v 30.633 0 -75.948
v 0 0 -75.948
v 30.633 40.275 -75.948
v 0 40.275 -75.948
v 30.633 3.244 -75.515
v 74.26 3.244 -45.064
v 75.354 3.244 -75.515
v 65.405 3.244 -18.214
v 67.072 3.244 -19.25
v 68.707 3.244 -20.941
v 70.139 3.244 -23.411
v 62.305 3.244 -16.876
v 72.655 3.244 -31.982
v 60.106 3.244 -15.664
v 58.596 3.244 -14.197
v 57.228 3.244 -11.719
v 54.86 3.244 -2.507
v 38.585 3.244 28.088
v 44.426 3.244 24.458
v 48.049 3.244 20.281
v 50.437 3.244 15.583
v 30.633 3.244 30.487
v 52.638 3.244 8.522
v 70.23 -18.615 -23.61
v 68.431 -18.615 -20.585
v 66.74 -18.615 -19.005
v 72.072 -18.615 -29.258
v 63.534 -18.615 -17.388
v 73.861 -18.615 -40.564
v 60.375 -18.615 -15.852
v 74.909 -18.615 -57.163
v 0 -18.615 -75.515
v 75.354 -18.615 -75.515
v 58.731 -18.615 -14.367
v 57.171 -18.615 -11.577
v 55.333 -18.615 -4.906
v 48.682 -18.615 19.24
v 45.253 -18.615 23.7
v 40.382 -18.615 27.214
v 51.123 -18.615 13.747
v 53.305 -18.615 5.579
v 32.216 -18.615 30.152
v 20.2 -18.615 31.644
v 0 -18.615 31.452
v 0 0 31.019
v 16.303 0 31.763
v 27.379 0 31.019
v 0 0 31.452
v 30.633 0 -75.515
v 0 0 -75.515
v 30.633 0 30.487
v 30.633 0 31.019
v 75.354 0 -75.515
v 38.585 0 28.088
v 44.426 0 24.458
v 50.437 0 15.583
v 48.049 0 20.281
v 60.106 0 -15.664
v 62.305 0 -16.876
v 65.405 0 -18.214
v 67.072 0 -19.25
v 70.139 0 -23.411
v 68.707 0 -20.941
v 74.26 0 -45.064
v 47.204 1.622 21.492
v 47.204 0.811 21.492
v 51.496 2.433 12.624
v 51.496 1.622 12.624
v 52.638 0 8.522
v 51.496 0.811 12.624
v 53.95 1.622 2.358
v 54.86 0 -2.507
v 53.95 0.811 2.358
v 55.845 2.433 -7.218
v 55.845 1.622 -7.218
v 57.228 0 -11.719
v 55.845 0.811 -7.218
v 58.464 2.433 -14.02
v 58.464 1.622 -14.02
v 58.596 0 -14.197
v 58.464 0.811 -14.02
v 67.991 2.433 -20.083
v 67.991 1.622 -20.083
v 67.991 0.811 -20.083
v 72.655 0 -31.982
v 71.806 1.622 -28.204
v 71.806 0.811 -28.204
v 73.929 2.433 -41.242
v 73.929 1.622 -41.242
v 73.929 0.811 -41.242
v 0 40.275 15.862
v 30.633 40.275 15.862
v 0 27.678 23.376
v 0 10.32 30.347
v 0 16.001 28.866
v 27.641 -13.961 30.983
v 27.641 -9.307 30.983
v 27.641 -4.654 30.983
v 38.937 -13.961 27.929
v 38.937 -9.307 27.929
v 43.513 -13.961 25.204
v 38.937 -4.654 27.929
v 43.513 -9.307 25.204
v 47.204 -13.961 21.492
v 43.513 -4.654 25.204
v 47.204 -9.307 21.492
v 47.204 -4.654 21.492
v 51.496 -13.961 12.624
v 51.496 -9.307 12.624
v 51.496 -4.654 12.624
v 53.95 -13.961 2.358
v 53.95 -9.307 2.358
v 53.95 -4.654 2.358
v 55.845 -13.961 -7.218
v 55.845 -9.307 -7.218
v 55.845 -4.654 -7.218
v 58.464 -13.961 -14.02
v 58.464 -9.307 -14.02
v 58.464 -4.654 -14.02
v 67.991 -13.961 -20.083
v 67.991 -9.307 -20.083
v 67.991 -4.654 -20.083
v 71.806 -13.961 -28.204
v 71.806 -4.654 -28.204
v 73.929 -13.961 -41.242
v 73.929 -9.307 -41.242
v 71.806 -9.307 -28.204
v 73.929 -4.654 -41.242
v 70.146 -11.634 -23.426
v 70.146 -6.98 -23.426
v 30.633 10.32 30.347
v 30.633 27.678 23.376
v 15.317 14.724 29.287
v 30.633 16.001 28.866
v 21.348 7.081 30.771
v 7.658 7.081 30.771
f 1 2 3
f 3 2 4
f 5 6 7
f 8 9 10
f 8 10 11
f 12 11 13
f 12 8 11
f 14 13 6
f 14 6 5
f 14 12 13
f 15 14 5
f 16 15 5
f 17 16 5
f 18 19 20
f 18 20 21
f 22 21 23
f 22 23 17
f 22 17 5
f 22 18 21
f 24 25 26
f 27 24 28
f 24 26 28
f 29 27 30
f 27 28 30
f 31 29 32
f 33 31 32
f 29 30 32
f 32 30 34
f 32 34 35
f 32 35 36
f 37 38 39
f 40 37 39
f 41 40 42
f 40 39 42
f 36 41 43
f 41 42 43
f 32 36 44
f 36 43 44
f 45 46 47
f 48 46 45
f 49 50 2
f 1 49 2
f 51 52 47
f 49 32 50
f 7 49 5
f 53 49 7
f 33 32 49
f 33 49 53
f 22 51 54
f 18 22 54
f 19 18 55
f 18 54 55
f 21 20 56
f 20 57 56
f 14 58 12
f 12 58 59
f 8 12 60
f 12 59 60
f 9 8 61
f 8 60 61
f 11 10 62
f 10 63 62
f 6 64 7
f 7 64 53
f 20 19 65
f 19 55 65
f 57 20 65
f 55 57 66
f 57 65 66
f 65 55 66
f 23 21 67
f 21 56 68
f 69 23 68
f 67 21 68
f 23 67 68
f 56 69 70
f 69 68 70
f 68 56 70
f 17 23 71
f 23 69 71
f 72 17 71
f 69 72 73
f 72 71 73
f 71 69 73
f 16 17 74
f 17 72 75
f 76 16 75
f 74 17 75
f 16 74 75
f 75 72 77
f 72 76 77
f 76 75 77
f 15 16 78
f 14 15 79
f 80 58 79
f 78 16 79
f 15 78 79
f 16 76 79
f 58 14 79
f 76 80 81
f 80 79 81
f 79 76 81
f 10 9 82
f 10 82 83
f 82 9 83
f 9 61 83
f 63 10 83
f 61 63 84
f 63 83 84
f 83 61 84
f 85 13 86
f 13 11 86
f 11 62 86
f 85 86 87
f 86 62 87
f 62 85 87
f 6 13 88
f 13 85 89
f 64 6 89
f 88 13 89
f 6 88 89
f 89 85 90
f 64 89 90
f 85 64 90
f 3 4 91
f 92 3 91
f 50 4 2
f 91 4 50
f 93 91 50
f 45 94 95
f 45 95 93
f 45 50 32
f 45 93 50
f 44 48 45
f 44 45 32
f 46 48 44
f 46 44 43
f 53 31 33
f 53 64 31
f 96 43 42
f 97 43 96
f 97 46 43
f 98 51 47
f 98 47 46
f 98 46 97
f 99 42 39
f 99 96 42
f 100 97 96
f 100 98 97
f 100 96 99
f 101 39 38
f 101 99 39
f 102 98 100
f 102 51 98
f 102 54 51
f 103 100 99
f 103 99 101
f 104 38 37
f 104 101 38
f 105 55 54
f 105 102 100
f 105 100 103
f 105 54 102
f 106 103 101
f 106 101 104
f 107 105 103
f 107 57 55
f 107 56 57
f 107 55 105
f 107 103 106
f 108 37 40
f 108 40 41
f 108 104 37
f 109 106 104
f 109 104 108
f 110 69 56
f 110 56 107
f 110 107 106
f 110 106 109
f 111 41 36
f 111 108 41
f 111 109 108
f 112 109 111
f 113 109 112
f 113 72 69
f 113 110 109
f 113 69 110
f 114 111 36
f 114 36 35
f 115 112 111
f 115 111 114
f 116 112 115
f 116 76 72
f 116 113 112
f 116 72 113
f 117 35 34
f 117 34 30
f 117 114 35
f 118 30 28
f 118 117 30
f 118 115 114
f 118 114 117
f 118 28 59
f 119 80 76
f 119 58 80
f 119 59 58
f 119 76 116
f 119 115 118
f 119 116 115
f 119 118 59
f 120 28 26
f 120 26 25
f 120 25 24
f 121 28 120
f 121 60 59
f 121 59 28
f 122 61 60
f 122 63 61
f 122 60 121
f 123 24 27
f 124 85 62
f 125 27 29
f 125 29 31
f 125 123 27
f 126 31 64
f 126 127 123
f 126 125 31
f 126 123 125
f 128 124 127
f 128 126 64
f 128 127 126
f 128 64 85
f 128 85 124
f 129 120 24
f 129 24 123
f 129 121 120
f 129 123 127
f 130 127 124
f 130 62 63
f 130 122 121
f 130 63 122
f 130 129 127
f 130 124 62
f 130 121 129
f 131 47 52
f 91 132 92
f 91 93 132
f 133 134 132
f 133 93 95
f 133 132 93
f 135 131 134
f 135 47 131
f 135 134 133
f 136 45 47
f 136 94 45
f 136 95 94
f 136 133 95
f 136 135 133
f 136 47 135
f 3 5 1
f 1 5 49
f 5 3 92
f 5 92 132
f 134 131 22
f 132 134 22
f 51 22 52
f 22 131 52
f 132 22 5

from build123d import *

# Parameters (mm, degrees)
F1_DEPTH = 18.6145622283
F3_DEPTH = 30.6332651526
F4_DEPTH = 3.2437127084


with BuildPart() as f1:
    # F0 (on Front) → F1 (new body)
    with BuildSketch(Plane.XZ):
        with BuildLine():
            add(Edge.make_bspline(
                [(0, 31.4521491528), (19.3250022149, 32.1420349874), (55.63183594, 33.4381572148), (53.4807526814, -18.3300440163), (74.2555818679, -15.9806421094), (74.9053246961, -51.2094172374), (75.3536224365, -75.5153298378)],
                knots=[0, 0, 0, 0, 0.2907666026, 0.5462774898, 0.6869562964, 1, 1, 1, 1], degree=3))
            Line((0, 31.4521491528), (0, -75.5153298378))
            Line((0, -75.5153298378), (75.3536224365, -75.5153298378))
        make_face()
    extrude(amount=F1_DEPTH)

    # F2 (on Right) → F3 (join)
    with BuildSketch(Plane.YZ):
        with BuildLine():
            add(Edge.make_bspline(
                [(0, 31.0191214085), (4.6584274068, 30.9906545137), (15.8166830326, 30.9224686442), (31.2721852153, 21.4055246166), (40.2752161026, 15.8617794514)],
                knots=[0, 0, 0, 0, 0.4174869414, 1, 1, 1, 1], degree=3))
            Line((0, 31.0191214085), (0, -75.9483873844))
            Line((0, -75.9483873844), (40.2752161026, -75.9483873844))
            Line((40.2752161026, -75.9483873844), (40.2752161026, 15.8617794514))
        make_face()
    extrude(amount=F3_DEPTH)

    # F4 (add): a face of the model
    f4_faces = [f1.faces().sort_by_distance(p)[0] for p in [
        (49.1816157145, 0, -32.8121359499),
    ]]
    extrude(f4_faces, amount=F4_DEPTH)


solid = f1.part
